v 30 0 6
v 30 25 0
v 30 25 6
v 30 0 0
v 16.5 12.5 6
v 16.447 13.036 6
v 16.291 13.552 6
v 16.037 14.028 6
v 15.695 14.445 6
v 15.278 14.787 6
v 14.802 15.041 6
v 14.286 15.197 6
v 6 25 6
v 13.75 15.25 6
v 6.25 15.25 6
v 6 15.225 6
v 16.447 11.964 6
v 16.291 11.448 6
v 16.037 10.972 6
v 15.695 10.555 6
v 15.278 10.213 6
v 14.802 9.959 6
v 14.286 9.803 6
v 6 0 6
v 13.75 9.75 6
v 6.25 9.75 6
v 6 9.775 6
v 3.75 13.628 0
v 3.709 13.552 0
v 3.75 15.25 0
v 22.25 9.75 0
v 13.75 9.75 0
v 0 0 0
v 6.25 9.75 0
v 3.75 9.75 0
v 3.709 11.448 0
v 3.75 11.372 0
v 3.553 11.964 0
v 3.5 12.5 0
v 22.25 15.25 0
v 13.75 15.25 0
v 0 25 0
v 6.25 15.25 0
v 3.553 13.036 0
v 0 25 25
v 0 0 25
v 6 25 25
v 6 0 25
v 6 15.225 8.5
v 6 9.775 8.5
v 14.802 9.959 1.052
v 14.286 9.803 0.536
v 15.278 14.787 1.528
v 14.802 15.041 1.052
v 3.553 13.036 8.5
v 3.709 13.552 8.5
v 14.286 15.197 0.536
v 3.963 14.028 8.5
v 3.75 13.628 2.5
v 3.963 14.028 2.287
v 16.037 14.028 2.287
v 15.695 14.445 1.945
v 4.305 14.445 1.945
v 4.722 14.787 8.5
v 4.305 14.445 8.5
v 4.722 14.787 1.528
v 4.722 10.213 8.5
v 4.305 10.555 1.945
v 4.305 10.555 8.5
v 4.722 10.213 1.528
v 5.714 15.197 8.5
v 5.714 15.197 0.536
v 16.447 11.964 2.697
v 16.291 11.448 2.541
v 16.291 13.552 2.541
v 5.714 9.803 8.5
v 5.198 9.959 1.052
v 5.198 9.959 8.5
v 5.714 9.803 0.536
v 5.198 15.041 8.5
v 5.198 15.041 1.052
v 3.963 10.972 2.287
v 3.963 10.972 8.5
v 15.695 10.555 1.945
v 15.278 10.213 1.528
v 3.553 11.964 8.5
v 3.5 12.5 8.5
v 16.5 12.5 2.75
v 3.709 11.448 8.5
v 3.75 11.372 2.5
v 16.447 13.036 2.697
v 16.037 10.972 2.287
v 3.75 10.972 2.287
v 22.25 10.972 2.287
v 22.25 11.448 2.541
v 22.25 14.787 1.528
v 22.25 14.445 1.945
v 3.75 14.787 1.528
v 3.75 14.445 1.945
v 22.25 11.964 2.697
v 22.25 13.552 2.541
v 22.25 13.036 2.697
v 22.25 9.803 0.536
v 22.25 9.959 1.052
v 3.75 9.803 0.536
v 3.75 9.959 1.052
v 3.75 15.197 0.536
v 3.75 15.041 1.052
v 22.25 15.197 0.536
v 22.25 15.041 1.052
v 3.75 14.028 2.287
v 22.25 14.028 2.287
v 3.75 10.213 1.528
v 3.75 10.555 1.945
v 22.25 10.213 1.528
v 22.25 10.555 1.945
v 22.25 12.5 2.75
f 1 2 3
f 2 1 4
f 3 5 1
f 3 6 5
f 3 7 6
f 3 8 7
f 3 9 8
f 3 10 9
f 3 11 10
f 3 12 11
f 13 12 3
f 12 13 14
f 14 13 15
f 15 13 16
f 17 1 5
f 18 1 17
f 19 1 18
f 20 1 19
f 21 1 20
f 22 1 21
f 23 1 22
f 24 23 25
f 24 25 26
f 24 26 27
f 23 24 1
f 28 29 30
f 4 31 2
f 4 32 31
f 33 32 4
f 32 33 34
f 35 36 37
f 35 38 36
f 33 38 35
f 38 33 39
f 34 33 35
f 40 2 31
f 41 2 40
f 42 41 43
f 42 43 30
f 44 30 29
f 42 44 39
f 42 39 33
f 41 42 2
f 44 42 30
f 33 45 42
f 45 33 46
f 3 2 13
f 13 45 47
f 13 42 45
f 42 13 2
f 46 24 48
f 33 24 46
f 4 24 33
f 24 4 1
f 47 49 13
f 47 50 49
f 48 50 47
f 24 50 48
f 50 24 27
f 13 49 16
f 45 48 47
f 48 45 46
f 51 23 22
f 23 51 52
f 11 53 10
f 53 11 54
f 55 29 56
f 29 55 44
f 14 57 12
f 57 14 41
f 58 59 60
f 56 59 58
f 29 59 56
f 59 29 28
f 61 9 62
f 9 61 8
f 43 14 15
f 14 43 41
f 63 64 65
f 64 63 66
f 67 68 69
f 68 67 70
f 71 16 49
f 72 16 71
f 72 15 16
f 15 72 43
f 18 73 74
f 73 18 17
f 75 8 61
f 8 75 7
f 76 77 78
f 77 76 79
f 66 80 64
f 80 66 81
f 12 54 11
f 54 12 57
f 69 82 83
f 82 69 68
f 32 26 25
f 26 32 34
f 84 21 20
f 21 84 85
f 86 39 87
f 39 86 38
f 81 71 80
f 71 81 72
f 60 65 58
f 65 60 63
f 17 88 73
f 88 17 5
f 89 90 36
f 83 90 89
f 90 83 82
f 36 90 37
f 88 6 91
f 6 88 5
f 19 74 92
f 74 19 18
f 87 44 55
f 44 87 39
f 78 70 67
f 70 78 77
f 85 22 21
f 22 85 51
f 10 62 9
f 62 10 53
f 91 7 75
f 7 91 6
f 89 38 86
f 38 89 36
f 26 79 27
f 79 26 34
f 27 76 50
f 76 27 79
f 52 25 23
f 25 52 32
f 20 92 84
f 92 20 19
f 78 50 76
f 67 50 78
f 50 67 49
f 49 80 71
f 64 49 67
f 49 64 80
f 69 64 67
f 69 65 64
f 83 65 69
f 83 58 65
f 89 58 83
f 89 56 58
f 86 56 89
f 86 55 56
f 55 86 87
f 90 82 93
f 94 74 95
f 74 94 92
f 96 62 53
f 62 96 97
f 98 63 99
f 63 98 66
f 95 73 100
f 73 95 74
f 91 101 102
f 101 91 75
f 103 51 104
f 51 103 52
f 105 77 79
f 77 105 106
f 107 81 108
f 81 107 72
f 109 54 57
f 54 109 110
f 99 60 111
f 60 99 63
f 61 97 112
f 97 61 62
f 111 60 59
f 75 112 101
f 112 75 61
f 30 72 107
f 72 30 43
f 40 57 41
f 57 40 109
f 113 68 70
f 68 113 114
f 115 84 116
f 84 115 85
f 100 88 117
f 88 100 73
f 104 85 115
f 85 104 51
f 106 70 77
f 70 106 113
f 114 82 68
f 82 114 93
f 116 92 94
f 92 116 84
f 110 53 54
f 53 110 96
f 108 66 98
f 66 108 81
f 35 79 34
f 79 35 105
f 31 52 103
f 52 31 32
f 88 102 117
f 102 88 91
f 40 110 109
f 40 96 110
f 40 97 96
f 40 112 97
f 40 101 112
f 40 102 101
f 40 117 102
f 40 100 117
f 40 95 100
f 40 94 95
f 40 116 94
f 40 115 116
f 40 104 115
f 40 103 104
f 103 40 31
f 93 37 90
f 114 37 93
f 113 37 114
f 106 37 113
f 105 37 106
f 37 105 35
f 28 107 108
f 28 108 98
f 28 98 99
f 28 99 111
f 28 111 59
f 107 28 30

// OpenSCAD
$fn = 32;

// ----------------------------------------------------------------------
// L-bracket: 30 x 25 x 25 mm
// ----------------------------------------------------------------------

// --- parameters (mm) ---
base_len = 30;            // horizontal leg, X
upright_h = 25;           // vertical leg, Z
flange_w = 25;            // bracket depth, Y
mat_t = 6;                // plate thickness
hole_d = 4.5;             // clearance for M4
slot_w = 5.5;             // euro screw slot width
slot_l = 13;              // euro screw slot length

module hole_z(px, py) {
  translate([px, py, -2.5]) cylinder(h = mat_t + 5, d = hole_d);
}
module hole_x(pz, py) {
  translate([-2.5, py, pz]) rotate([0, 90, 0]) cylinder(h = mat_t + 5, d = hole_d);
}
module euro_slot_z(px, py) {
  hull() {
    translate([px - (slot_l - slot_w) / 2, py, -2.5]) cylinder(h = mat_t + 5, d = slot_w);
    translate([px + (slot_l - slot_w) / 2, py, -2.5]) cylinder(h = mat_t + 5, d = slot_w);
  }
}
module euro_slot_x(pz, py) {
  translate([-2.5, 0, 0]) rotate([0, 90, 0]) hull() {
    translate([0, py, pz - (slot_l - slot_w) / 2]) cylinder(h = mat_t + 5, d = slot_w);
    translate([0, py, pz + (slot_l - slot_w) / 2]) cylinder(h = mat_t + 5, d = slot_w);
  }
}

difference() {
  union() {
    /* horizontal leg */
    cube([base_len, flange_w, mat_t]);
    /* vertical leg, overlapping the corner block */
    cube([mat_t, flange_w, upright_h]);
  }
  euro_slot_z(10, 12.5);
  euro_slot_x(10, 12.5);
}
